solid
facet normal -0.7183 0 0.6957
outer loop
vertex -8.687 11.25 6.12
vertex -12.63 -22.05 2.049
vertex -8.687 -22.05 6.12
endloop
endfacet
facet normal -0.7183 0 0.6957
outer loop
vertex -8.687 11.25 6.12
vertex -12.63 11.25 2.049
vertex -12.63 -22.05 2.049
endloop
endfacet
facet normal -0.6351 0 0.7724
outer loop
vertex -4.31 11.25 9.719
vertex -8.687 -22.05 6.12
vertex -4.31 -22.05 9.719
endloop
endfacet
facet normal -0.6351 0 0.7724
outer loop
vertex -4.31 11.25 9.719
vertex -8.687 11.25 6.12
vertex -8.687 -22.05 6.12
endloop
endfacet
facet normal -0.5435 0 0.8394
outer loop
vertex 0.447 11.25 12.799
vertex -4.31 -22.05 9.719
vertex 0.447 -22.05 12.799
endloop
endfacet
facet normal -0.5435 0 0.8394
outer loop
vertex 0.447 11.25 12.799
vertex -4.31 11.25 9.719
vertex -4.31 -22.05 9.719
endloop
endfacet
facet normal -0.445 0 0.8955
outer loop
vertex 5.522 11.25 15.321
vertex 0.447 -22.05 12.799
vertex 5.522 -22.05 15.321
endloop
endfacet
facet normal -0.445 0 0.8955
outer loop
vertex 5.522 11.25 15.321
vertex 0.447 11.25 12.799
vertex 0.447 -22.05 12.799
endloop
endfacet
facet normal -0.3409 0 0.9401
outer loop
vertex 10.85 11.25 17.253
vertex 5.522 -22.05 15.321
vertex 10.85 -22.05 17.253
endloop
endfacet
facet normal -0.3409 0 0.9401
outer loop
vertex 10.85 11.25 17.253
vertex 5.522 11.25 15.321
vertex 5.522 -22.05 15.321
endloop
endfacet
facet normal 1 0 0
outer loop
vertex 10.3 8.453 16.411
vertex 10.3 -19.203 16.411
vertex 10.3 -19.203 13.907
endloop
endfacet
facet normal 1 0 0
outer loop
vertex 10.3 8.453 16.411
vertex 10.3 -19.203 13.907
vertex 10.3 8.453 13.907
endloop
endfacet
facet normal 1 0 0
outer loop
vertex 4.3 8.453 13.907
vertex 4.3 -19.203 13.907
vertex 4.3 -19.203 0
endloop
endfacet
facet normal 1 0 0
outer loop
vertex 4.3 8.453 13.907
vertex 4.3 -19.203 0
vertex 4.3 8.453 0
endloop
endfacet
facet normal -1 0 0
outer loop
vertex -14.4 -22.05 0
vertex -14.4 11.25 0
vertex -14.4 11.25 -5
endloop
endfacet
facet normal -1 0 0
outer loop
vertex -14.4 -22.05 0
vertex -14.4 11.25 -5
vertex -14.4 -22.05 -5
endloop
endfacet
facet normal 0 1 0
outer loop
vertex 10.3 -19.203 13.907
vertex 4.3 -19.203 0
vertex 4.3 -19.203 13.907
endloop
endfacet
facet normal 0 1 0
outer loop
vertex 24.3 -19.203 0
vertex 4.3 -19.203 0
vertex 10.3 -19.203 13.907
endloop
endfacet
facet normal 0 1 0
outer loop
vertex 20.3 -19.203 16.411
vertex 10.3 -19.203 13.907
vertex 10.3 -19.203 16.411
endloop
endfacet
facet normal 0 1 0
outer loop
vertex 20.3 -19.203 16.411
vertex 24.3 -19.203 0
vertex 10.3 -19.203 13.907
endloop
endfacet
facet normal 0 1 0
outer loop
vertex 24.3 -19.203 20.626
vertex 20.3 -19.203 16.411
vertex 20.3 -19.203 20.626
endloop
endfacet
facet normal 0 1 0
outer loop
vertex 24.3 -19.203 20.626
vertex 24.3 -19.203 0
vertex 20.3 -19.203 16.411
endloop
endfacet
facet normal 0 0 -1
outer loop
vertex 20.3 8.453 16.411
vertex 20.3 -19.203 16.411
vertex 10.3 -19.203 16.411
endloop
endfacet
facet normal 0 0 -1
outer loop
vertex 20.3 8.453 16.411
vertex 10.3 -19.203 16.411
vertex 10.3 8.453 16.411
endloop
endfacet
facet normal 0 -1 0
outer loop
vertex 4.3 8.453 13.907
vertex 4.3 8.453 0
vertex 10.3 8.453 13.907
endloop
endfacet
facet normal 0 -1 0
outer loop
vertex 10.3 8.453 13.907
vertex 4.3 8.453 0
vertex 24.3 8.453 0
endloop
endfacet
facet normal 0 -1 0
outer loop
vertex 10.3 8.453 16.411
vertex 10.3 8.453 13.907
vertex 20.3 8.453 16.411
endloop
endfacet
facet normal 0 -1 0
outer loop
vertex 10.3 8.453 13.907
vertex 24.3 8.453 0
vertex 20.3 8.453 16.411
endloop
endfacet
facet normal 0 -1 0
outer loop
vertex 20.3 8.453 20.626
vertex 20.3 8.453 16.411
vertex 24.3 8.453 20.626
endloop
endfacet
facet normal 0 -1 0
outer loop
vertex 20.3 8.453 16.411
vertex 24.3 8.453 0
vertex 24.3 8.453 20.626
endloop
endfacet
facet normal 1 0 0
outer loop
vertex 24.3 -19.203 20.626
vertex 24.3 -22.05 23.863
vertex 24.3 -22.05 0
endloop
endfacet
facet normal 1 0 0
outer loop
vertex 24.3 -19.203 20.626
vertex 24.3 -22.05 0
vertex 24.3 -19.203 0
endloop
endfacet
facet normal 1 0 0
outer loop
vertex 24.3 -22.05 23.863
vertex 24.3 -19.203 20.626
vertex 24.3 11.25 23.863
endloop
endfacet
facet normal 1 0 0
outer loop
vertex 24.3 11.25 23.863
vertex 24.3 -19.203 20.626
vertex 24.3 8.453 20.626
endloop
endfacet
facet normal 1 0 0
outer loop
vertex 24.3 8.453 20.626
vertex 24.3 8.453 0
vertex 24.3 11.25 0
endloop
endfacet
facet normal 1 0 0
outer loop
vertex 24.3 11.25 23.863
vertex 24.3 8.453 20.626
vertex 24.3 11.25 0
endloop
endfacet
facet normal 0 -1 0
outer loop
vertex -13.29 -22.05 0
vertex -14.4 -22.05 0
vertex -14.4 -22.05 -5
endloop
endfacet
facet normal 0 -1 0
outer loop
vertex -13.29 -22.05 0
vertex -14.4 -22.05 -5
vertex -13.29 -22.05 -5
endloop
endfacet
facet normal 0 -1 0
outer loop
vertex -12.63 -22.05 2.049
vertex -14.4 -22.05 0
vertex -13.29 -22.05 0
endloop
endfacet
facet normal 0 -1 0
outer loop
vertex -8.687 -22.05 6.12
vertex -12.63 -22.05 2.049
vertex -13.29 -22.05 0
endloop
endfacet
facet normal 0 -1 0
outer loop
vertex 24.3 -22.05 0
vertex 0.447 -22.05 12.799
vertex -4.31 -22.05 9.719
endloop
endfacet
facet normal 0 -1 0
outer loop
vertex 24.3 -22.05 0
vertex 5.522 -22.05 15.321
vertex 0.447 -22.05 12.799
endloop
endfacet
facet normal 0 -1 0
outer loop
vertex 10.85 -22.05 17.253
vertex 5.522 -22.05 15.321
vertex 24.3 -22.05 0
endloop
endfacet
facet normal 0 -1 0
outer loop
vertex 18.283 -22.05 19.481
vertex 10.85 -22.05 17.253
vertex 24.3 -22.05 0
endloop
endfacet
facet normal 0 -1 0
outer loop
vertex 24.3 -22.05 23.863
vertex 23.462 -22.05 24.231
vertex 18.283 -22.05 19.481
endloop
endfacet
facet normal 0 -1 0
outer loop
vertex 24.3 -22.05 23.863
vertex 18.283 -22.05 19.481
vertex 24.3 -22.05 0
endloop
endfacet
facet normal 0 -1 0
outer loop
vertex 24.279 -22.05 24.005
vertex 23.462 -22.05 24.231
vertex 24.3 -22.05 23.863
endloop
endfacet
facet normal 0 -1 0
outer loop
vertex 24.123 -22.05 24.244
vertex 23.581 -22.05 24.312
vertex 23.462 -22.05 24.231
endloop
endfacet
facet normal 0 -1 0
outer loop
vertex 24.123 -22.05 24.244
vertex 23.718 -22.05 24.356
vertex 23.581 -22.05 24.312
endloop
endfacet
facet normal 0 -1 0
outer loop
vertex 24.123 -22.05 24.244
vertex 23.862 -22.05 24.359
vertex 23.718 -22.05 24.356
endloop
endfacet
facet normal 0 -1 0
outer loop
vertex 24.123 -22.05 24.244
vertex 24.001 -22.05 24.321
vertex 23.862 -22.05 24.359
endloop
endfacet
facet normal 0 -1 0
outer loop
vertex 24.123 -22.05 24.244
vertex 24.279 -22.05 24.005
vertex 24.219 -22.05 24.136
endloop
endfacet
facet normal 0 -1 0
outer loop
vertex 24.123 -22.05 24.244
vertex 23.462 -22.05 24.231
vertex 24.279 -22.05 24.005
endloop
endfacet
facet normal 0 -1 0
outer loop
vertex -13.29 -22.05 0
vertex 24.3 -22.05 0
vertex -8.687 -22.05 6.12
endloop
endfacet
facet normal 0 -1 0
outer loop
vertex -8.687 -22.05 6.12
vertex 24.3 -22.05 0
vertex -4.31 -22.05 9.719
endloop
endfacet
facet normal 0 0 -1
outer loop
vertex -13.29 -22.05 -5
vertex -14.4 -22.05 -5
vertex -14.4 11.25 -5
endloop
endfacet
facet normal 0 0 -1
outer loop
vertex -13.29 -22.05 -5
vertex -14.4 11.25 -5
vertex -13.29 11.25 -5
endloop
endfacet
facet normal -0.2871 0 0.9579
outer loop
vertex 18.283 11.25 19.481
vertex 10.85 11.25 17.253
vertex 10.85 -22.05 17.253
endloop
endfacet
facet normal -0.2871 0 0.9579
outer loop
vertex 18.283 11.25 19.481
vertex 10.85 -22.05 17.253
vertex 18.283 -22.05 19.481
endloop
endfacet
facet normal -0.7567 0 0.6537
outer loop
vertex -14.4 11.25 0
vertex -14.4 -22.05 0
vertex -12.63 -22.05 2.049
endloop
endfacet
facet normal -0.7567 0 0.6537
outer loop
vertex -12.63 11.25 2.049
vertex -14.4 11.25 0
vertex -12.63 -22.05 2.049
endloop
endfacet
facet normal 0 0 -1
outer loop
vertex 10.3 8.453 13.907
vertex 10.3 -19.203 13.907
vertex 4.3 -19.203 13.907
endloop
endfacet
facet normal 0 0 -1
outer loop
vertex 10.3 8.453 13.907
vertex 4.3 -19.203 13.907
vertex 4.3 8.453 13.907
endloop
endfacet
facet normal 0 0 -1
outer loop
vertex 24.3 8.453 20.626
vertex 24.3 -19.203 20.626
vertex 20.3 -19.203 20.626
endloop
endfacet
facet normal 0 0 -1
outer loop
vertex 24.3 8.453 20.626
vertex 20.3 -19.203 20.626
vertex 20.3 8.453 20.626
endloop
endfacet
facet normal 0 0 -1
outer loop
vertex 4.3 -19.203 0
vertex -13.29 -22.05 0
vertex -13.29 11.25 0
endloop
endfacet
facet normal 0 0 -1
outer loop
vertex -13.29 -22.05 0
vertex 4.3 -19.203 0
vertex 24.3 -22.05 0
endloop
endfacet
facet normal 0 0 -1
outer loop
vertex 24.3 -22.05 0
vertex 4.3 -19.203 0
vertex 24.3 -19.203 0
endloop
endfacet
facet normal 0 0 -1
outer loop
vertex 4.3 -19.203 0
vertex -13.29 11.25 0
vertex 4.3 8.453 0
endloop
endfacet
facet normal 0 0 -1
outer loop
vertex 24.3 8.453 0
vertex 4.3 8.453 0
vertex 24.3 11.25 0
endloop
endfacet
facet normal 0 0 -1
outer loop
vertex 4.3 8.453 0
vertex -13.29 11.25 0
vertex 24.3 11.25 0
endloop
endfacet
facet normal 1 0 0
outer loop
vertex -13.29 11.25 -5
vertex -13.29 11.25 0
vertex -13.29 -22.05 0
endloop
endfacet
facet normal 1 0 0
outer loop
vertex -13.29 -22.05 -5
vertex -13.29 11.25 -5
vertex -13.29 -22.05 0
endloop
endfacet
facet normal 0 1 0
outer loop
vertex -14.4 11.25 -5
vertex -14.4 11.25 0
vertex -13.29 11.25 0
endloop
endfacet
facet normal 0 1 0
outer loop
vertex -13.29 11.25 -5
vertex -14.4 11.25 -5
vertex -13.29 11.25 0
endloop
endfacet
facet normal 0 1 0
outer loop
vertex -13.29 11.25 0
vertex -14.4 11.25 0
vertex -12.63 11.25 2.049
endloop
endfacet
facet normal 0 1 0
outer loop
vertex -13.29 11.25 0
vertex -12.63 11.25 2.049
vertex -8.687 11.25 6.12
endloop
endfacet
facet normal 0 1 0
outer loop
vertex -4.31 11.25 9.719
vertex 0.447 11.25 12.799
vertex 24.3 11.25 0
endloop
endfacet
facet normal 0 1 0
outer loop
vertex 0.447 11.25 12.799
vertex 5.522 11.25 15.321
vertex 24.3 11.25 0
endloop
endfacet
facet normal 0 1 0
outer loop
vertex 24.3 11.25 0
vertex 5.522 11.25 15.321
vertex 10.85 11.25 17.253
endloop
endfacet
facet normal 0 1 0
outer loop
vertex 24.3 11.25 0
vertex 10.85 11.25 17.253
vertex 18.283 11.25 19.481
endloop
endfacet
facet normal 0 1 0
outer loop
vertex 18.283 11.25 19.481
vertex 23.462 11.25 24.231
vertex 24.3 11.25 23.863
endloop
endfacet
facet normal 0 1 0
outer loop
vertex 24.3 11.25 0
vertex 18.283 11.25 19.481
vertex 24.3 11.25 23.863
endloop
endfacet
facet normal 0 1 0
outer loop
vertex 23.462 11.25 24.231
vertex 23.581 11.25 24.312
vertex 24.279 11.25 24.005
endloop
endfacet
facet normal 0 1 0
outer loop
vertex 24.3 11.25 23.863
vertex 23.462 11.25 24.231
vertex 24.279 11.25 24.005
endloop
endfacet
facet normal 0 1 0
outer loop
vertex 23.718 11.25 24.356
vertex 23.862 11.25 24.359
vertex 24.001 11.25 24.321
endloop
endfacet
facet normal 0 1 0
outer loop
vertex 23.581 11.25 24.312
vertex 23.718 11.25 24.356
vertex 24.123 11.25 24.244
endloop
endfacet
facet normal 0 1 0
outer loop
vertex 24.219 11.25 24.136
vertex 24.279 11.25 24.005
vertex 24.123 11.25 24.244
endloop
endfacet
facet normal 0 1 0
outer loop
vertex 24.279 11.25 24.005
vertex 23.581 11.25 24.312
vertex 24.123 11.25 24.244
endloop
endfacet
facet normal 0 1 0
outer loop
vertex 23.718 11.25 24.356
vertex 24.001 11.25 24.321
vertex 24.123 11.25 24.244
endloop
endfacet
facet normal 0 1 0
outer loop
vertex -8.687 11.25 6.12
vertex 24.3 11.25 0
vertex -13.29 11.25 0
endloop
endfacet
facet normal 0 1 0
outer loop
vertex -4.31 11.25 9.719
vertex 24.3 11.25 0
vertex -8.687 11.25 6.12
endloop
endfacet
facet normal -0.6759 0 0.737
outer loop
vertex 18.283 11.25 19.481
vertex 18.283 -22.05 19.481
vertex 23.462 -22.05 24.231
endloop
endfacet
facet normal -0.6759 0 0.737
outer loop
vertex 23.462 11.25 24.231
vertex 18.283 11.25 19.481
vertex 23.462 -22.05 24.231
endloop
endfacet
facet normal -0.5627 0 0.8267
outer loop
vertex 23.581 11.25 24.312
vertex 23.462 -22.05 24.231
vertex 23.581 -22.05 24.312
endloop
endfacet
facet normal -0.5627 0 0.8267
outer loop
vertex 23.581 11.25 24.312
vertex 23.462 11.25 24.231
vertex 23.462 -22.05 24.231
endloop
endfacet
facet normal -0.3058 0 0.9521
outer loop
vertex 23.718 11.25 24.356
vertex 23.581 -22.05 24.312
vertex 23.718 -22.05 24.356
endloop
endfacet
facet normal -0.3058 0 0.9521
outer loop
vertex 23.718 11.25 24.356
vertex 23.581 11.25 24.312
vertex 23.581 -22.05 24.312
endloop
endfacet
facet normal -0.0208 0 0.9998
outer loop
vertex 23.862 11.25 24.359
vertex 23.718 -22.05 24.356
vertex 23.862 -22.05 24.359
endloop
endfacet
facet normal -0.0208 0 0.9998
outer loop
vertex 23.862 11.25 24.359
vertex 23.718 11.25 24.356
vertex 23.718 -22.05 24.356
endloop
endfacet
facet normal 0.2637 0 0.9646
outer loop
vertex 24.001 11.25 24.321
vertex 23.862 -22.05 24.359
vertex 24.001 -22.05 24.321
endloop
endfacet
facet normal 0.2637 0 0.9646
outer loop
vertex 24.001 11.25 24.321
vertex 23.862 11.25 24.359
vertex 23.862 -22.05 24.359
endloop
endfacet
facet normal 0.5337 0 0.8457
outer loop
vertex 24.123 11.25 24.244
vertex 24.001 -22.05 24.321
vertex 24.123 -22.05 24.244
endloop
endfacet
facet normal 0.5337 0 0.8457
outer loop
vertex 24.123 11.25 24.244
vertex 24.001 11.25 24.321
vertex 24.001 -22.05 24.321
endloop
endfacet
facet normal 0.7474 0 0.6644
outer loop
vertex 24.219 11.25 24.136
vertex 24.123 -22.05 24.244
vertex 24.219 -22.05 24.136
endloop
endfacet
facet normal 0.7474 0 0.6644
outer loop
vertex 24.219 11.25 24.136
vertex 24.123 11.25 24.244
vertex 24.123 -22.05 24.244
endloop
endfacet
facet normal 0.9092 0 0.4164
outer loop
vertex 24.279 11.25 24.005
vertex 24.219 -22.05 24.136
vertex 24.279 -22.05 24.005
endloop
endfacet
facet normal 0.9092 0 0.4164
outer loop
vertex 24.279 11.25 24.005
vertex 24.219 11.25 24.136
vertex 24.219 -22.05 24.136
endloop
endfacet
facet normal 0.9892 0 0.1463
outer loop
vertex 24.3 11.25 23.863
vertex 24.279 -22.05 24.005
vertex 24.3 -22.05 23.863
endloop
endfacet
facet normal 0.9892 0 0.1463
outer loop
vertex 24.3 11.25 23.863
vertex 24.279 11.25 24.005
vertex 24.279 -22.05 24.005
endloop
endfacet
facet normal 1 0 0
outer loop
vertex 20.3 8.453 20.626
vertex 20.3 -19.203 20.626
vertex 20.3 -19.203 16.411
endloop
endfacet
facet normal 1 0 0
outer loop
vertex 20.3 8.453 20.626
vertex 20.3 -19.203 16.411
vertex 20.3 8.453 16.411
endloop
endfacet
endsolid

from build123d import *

# Parameters (mm, degrees)
F0_W      = 38.7000013143
F0_H      = 33.3000021055
F1_DEPTH  = 25
F3_DEPTH  = 33.3010021055
F4_R      = 50
F5_R      = 0.5
F6_W      = 27.6561714709
F6_H      = 20.6264536828
F7_DEPTH  = 4
F8_W      = 27.6561714709
F8_H      = 16.4114236832
F9_DEPTH  = 10
F10_W     = 27.6561714709
F10_H     = 13.9069892466
F11_DEPTH = 6
F12_W     = 1.1095879599
F12_H     = 33.3000021055
F13_DEPTH = 5


with BuildPart() as f1:
    # F0 (on Top) → F1 (new body)
    with BuildSketch(Plane.XY):
        with Locations((4.9499990419, -5.3999996744)):
            Rectangle(F0_W, F0_H)
    extrude(amount=F1_DEPTH)

    # F2 (on face) → F3 (cut, through all)
    with BuildSketch(Plane.XZ.offset(22.0500007272)):
        Polygon((-14.4000016153, 25), (-14.4000016153, 0), (-3.1048920937, 13.0713665858), (18.2830113918, 19.4805841893), (24.299999699, 25), align=None)
    extrude(amount=-F3_DEPTH, mode=Mode.SUBTRACT)

    # F4
    f4_edges = [f1.edges().sort_by_distance(p)[0] for p in [
        (-3.104892, -5.4, 13.071367),
    ]]
    fillet(f4_edges, radius=F4_R)

    # F5
    f5_edges = [f1.edges().sort_by_distance(p)[0] for p in [
        (24.3, -5.4, 25),
    ]]
    fillet(f5_edges, radius=F5_R)

    # F6 (on face) → F7 (cut)
    with BuildSketch(Plane.YZ.offset(24.299999699)):
        with Locations((-5.37536107, 10.3132268414)):
            Rectangle(F6_W, F6_H)
    extrude(amount=-F7_DEPTH, mode=Mode.SUBTRACT)

    # F8 (on face) → F9 (cut)
    with BuildSketch(Plane.YZ.offset(20.299999699)):
        with Locations((-5.37536107, 8.2057118416)):
            Rectangle(F8_W, F8_H)
    extrude(amount=-F9_DEPTH, mode=Mode.SUBTRACT)

    # F10 (on face) → F11 (cut)
    with BuildSketch(Plane.YZ.offset(10.299999699)):
        with Locations((-5.37536107, 6.9534946233)):
            Rectangle(F10_W, F10_H)
    extrude(amount=-F11_DEPTH, mode=Mode.SUBTRACT)

    # F12 (on face) → F13 (join)
    with BuildSketch(Plane(origin=(0, 0, 0), x_dir=(1, 0, 0), z_dir=(0, 0, -1))):
        with Locations((-13.8452076353, 5.3999996744)):
            Rectangle(F12_W, F12_H)
    extrude(amount=F13_DEPTH)


solid = f1.part
